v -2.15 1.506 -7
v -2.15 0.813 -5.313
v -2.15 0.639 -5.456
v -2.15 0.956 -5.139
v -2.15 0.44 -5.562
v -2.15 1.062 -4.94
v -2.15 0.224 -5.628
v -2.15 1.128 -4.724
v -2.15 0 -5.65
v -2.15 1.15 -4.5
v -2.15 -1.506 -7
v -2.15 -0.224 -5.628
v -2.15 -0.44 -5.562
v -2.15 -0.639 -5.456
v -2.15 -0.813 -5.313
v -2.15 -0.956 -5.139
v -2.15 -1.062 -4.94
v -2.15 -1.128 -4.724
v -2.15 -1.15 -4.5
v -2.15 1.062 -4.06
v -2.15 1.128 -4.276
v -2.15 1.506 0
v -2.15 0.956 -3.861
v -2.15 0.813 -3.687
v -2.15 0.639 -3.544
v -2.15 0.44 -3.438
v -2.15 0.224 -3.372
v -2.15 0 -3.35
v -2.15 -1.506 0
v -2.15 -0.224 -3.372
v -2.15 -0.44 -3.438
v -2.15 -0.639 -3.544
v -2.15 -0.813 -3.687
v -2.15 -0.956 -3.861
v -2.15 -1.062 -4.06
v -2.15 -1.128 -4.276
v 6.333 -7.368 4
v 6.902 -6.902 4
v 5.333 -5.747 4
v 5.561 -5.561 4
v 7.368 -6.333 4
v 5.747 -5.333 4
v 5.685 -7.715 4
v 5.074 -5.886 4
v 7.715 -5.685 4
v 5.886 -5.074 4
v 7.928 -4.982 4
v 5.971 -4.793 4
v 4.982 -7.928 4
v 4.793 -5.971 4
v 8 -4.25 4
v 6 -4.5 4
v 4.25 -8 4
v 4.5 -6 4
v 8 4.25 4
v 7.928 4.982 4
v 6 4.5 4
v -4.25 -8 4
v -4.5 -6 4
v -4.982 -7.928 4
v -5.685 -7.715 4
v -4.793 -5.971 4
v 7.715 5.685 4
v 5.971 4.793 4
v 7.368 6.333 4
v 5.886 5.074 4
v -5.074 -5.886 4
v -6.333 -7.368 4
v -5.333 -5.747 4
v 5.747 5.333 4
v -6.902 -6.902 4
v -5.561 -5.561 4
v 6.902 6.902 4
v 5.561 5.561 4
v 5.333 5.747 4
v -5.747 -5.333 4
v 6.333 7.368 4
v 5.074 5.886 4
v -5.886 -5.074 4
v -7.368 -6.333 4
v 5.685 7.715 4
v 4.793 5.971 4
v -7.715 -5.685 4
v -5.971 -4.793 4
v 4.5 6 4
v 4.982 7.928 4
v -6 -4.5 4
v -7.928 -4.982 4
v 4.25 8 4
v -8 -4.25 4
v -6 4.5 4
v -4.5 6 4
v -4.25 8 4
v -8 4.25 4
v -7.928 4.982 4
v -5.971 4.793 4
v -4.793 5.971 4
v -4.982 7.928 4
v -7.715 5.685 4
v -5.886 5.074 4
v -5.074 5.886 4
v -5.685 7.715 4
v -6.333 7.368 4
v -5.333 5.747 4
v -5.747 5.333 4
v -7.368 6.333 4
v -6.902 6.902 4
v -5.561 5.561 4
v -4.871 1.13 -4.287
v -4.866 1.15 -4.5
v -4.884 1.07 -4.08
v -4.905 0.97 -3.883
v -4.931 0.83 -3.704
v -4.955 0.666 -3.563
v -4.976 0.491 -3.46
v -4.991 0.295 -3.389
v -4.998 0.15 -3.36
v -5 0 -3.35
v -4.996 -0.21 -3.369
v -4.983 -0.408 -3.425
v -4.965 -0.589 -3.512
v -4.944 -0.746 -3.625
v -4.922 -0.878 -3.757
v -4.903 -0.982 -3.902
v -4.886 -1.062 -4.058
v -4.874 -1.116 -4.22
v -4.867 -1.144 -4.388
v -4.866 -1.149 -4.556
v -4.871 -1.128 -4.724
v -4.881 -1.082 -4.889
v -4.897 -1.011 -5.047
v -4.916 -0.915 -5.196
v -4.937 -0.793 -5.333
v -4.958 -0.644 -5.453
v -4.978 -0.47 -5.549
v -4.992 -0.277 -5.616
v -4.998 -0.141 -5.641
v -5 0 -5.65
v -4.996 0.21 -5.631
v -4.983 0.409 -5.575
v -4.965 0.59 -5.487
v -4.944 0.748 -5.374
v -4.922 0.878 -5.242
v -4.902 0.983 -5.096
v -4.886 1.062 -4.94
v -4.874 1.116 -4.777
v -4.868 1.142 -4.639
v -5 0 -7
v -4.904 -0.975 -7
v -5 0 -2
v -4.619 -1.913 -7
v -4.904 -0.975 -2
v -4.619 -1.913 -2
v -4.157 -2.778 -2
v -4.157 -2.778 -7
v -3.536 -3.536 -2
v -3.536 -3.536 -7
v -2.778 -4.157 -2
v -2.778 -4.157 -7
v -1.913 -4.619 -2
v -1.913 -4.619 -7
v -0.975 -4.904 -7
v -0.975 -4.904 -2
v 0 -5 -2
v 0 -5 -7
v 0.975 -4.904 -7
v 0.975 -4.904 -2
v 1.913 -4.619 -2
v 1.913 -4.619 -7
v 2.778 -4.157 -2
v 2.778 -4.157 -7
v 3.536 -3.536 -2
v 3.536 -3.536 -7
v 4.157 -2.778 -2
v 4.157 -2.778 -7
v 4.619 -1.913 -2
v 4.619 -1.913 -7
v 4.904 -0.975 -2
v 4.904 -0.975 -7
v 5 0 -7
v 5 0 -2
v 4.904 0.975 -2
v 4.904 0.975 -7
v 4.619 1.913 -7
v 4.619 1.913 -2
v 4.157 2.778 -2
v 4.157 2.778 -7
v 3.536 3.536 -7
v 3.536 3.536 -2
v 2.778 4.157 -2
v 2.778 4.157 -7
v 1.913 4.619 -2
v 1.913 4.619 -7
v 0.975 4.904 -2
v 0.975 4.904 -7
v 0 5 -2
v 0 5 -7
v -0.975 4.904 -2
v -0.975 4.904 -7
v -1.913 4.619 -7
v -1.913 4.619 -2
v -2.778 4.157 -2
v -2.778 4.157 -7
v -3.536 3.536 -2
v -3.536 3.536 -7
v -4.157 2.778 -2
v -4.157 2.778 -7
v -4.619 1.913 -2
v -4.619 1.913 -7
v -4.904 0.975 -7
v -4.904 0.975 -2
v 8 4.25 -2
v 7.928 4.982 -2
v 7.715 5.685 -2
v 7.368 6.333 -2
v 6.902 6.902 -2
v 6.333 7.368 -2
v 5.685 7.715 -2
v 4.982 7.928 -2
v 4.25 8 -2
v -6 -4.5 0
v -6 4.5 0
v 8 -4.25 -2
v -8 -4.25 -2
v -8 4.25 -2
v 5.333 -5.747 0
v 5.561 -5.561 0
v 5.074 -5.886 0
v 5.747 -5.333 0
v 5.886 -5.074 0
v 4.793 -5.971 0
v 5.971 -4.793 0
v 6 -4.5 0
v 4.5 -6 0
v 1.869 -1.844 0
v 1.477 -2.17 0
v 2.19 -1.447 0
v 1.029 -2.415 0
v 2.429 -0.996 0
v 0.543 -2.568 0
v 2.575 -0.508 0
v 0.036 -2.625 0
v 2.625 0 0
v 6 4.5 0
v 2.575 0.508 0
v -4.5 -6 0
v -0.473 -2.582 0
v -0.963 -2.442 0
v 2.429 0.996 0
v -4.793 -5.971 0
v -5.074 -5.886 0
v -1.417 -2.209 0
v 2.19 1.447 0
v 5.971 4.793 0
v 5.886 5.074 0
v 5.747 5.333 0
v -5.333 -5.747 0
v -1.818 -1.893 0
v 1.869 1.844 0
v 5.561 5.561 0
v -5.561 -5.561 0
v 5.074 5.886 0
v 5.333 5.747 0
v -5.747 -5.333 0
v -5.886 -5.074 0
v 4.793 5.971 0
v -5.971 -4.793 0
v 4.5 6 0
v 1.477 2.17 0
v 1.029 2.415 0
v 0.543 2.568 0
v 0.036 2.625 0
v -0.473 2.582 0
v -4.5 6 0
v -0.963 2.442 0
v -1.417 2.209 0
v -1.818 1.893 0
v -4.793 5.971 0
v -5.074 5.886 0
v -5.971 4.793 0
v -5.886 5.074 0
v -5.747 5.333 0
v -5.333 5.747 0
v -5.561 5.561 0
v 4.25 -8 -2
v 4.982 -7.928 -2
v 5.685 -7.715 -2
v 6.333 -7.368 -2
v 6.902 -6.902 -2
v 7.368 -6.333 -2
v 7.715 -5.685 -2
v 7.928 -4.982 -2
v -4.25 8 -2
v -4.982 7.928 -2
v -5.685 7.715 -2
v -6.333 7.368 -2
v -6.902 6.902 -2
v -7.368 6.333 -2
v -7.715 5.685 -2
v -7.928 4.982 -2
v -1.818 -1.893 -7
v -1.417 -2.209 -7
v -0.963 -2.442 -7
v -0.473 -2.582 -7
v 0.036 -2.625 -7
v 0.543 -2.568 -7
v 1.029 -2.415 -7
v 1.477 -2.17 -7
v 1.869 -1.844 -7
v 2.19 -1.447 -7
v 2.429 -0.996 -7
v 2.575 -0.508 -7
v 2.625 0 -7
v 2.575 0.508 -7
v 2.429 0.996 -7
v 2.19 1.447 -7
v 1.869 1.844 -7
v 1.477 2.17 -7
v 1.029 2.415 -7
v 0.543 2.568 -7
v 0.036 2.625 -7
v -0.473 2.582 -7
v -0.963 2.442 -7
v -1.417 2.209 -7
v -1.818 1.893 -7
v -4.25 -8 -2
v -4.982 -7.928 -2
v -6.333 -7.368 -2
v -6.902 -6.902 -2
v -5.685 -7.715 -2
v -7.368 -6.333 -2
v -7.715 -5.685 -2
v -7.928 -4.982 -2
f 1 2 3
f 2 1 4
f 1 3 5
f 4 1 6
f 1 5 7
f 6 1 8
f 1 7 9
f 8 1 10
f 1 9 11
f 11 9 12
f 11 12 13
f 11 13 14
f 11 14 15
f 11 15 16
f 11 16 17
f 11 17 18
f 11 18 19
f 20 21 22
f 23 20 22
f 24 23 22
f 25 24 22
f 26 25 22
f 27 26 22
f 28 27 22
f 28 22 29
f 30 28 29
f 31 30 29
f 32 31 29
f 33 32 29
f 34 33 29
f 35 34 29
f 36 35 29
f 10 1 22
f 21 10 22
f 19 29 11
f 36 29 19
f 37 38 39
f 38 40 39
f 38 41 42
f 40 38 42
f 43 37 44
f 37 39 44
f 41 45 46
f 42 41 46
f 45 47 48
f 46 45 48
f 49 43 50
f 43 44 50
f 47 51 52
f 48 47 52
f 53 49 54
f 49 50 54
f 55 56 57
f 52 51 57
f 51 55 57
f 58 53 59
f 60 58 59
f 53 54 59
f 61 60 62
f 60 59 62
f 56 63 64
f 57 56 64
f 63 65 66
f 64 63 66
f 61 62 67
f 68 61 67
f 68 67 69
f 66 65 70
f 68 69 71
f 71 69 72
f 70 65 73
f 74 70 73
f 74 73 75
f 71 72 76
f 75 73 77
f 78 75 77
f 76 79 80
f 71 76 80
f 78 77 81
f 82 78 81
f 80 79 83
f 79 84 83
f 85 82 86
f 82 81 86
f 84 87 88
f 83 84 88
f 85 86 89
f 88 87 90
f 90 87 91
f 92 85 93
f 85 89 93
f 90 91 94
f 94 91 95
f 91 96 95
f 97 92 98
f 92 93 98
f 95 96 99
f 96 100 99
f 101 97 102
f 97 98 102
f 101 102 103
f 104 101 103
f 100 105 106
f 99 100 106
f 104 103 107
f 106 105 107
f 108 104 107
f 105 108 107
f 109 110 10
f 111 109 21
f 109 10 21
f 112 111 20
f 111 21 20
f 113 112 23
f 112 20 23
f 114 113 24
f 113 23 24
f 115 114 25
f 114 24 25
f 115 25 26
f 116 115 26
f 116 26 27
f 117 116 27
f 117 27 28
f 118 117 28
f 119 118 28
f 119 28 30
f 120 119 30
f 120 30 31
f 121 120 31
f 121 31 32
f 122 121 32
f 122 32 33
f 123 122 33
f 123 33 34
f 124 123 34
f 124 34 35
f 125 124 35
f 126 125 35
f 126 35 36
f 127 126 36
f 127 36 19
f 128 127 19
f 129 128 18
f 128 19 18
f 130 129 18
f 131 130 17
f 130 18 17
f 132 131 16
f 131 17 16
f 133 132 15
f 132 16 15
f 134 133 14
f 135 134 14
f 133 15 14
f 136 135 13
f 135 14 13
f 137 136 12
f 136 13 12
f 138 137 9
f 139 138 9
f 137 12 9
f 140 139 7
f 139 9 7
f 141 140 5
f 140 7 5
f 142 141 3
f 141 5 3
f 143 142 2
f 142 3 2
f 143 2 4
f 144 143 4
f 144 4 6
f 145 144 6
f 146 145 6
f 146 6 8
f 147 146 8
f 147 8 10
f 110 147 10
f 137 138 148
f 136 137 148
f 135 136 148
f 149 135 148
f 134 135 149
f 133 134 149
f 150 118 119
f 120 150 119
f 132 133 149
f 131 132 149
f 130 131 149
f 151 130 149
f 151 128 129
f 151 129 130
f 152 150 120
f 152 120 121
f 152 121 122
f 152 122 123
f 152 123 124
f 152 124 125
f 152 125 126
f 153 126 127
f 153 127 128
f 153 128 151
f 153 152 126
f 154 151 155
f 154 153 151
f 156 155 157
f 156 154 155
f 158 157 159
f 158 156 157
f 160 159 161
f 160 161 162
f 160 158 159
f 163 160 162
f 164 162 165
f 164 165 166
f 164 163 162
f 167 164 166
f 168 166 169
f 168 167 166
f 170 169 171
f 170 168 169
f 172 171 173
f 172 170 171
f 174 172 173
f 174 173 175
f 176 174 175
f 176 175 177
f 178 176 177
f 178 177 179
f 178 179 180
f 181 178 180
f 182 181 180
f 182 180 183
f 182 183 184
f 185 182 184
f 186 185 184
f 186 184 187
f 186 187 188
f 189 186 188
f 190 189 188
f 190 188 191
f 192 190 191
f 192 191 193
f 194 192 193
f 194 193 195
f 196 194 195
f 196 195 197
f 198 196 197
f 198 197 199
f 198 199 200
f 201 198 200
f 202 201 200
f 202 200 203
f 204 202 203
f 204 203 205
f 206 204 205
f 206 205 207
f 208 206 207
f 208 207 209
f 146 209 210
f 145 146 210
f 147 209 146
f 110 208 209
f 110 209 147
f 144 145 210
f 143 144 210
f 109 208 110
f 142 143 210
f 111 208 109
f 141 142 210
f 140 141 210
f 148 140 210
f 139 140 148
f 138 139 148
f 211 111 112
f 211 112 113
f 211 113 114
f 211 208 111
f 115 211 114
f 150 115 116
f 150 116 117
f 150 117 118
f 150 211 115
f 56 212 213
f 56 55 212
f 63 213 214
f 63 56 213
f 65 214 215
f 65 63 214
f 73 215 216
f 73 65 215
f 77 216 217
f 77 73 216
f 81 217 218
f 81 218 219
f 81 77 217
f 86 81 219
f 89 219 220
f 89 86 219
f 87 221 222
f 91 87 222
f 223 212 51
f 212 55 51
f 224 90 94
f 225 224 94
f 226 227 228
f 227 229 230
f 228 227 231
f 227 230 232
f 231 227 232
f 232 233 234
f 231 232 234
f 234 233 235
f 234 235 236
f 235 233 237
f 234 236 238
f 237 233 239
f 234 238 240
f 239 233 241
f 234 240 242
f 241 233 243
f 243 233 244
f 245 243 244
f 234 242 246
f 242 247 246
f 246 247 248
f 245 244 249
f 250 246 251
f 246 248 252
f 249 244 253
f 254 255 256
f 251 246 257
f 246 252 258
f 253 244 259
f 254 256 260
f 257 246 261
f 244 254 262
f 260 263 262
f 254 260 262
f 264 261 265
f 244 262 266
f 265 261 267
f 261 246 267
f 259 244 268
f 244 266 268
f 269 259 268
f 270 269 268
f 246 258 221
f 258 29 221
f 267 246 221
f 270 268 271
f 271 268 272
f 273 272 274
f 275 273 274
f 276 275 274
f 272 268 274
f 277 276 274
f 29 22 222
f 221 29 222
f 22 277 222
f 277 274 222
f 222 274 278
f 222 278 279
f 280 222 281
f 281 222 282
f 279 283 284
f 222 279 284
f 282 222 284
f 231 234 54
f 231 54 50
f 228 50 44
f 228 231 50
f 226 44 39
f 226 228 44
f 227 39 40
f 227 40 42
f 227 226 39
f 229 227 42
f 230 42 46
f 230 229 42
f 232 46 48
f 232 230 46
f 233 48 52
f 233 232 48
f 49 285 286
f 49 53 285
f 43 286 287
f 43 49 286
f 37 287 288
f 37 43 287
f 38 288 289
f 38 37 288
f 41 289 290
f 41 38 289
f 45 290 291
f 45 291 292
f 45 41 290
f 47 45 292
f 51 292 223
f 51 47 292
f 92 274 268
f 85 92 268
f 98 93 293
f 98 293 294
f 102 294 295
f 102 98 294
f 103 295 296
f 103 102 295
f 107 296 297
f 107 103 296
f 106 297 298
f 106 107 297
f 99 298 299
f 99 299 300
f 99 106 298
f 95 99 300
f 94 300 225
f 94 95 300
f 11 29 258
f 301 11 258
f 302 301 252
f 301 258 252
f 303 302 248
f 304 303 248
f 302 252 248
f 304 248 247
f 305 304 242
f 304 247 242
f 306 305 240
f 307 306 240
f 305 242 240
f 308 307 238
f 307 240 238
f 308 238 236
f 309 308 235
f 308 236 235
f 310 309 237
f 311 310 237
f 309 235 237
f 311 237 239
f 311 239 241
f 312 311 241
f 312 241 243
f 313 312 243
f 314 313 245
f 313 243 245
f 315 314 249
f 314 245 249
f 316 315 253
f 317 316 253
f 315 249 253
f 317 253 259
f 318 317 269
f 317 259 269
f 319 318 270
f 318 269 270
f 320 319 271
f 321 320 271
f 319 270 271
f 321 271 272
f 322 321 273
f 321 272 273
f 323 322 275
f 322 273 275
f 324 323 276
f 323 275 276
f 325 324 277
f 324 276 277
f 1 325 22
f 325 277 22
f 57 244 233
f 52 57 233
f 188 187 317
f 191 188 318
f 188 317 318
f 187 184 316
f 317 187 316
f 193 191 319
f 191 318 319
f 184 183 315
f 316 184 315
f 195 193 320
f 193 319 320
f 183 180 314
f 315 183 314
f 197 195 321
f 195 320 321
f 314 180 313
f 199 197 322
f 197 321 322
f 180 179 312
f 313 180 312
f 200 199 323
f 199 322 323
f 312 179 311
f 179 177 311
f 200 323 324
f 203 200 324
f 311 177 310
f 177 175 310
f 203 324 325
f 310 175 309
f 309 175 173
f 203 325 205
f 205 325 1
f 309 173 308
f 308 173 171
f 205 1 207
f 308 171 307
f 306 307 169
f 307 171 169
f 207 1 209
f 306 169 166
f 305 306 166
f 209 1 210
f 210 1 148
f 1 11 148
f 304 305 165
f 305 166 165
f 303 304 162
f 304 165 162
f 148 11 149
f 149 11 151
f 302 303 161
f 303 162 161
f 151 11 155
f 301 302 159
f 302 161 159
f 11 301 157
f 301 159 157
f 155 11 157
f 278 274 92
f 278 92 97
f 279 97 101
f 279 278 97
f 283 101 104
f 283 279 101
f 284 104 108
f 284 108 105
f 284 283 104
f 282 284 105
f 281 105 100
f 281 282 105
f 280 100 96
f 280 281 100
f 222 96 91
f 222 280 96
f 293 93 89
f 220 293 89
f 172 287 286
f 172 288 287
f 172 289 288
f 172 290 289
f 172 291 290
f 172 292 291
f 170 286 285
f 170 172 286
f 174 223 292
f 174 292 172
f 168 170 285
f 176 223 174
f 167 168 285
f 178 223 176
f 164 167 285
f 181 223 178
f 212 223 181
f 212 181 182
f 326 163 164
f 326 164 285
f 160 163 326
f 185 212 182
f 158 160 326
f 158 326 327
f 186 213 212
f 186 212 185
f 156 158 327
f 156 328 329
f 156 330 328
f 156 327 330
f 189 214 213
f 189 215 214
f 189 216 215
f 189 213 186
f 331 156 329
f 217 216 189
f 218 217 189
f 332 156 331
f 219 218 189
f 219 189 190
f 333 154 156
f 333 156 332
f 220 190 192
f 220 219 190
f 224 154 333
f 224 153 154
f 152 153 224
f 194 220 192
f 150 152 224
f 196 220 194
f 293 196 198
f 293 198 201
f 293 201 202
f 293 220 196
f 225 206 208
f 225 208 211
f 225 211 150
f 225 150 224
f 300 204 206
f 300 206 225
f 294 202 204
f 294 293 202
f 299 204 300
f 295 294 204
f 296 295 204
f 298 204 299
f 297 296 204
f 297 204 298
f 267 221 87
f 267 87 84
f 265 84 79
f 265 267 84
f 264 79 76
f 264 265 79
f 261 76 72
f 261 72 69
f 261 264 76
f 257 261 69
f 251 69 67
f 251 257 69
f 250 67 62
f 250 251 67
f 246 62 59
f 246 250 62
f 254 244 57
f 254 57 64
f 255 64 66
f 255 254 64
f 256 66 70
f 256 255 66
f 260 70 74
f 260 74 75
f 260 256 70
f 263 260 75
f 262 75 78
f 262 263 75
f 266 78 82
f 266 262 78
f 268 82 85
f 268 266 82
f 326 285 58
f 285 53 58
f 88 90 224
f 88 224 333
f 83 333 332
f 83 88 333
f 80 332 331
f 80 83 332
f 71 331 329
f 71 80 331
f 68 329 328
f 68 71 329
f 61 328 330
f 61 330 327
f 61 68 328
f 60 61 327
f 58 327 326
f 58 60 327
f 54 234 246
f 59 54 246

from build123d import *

# Parameters (mm, degrees)
PAD_DEPTH    = 4
PAD001_DEPTH = 2
SKETCH002_R  = 5
PAD002_DEPTH = 7
SKETCH003_R  = 1.15
POCKET_DEPTH = 5


with BuildPart() as part:
    # Sketch → Pad (new body)
    with BuildSketch(Plane.XY):
        with BuildLine():
            Line((-4.25, 8), (4.25, 8))
            ThreePointArc((8, 4.25), (6.90165, 6.90165), (4.25, 8))
            Line((8, 4.25), (8, -4.25))
            ThreePointArc((4.25, -8), (6.90165, -6.90165), (8, -4.25))
            Line((4.25, -8), (-4.25, -8))
            ThreePointArc((-8, -4.25), (-6.90165, -6.90165), (-4.25, -8))
            Line((-8, -4.25), (-8, 4.25))
            ThreePointArc((-4.25, 8), (-6.90165, 6.90165), (-8, 4.25))
        make_face()
        with BuildLine():
            Line((-4.5, 6), (4.5, 6))
            ThreePointArc((6, 4.5), (5.56066, 5.56066), (4.5, 6))
            Line((6, 4.5), (6, -4.5))
            ThreePointArc((4.5, -6), (5.56066, -5.56066), (6, -4.5))
            Line((4.5, -6), (-4.5, -6))
            ThreePointArc((-6, -4.5), (-5.56066, -5.56066), (-4.5, -6))
            Line((-6, -4.5), (-6, 4.5))
            ThreePointArc((-4.5, 6), (-5.56066, 5.56066), (-6, 4.5))
        make_face(mode=Mode.SUBTRACT)
    extrude(amount=PAD_DEPTH)

    # Sketch001 → Pad001 (join)
    with BuildSketch(Plane.XY):
        with BuildLine():
            Line((-4.25, 8), (4.25, 8))
            ThreePointArc((8, 4.25), (6.90165, 6.90165), (4.25, 8))
            Line((8, 4.25), (8, -4.25))
            ThreePointArc((4.25, -8), (6.90165, -6.90165), (8, -4.25))
            Line((4.25, -8), (-4.25, -8))
            ThreePointArc((-8, -4.25), (-6.90165, -6.90165), (-4.25, -8))
            Line((-8, -4.25), (-8, 4.25))
            ThreePointArc((-4.25, 8), (-6.90165, 6.90165), (-8, 4.25))
        make_face()
        with BuildLine():
            ThreePointArc((-2.15, -1.50603), (2.625, 0), (-2.15, 1.50603))
            Line((-2.15, 1.50603), (-2.15, -1.50603))
        make_face(mode=Mode.SUBTRACT)
    extrude(amount=-PAD001_DEPTH)

    # Sketch002 → Pad002 (join)
    with BuildSketch(Plane(origin=(0, 0, 0), x_dir=(-1, 0, 0), z_dir=(0, 0, 1))):
        Circle(SKETCH002_R)
        with BuildLine():
            ThreePointArc((2.15, 1.50603), (-2.625, 0), (2.15, -1.50603))
            Line((2.15, 1.50603), (2.15, -1.50603))
        make_face(mode=Mode.SUBTRACT)
    extrude(amount=-PAD002_DEPTH)

    # Sketch003 → Pocket (cut)
    with BuildSketch(Plane(origin=(0, 0, -4.5), x_dir=(0, 1, 0), z_dir=(1, 0, 0))):
        Circle(SKETCH003_R)
    extrude(amount=-POCKET_DEPTH, mode=Mode.SUBTRACT)


solid = part.part
